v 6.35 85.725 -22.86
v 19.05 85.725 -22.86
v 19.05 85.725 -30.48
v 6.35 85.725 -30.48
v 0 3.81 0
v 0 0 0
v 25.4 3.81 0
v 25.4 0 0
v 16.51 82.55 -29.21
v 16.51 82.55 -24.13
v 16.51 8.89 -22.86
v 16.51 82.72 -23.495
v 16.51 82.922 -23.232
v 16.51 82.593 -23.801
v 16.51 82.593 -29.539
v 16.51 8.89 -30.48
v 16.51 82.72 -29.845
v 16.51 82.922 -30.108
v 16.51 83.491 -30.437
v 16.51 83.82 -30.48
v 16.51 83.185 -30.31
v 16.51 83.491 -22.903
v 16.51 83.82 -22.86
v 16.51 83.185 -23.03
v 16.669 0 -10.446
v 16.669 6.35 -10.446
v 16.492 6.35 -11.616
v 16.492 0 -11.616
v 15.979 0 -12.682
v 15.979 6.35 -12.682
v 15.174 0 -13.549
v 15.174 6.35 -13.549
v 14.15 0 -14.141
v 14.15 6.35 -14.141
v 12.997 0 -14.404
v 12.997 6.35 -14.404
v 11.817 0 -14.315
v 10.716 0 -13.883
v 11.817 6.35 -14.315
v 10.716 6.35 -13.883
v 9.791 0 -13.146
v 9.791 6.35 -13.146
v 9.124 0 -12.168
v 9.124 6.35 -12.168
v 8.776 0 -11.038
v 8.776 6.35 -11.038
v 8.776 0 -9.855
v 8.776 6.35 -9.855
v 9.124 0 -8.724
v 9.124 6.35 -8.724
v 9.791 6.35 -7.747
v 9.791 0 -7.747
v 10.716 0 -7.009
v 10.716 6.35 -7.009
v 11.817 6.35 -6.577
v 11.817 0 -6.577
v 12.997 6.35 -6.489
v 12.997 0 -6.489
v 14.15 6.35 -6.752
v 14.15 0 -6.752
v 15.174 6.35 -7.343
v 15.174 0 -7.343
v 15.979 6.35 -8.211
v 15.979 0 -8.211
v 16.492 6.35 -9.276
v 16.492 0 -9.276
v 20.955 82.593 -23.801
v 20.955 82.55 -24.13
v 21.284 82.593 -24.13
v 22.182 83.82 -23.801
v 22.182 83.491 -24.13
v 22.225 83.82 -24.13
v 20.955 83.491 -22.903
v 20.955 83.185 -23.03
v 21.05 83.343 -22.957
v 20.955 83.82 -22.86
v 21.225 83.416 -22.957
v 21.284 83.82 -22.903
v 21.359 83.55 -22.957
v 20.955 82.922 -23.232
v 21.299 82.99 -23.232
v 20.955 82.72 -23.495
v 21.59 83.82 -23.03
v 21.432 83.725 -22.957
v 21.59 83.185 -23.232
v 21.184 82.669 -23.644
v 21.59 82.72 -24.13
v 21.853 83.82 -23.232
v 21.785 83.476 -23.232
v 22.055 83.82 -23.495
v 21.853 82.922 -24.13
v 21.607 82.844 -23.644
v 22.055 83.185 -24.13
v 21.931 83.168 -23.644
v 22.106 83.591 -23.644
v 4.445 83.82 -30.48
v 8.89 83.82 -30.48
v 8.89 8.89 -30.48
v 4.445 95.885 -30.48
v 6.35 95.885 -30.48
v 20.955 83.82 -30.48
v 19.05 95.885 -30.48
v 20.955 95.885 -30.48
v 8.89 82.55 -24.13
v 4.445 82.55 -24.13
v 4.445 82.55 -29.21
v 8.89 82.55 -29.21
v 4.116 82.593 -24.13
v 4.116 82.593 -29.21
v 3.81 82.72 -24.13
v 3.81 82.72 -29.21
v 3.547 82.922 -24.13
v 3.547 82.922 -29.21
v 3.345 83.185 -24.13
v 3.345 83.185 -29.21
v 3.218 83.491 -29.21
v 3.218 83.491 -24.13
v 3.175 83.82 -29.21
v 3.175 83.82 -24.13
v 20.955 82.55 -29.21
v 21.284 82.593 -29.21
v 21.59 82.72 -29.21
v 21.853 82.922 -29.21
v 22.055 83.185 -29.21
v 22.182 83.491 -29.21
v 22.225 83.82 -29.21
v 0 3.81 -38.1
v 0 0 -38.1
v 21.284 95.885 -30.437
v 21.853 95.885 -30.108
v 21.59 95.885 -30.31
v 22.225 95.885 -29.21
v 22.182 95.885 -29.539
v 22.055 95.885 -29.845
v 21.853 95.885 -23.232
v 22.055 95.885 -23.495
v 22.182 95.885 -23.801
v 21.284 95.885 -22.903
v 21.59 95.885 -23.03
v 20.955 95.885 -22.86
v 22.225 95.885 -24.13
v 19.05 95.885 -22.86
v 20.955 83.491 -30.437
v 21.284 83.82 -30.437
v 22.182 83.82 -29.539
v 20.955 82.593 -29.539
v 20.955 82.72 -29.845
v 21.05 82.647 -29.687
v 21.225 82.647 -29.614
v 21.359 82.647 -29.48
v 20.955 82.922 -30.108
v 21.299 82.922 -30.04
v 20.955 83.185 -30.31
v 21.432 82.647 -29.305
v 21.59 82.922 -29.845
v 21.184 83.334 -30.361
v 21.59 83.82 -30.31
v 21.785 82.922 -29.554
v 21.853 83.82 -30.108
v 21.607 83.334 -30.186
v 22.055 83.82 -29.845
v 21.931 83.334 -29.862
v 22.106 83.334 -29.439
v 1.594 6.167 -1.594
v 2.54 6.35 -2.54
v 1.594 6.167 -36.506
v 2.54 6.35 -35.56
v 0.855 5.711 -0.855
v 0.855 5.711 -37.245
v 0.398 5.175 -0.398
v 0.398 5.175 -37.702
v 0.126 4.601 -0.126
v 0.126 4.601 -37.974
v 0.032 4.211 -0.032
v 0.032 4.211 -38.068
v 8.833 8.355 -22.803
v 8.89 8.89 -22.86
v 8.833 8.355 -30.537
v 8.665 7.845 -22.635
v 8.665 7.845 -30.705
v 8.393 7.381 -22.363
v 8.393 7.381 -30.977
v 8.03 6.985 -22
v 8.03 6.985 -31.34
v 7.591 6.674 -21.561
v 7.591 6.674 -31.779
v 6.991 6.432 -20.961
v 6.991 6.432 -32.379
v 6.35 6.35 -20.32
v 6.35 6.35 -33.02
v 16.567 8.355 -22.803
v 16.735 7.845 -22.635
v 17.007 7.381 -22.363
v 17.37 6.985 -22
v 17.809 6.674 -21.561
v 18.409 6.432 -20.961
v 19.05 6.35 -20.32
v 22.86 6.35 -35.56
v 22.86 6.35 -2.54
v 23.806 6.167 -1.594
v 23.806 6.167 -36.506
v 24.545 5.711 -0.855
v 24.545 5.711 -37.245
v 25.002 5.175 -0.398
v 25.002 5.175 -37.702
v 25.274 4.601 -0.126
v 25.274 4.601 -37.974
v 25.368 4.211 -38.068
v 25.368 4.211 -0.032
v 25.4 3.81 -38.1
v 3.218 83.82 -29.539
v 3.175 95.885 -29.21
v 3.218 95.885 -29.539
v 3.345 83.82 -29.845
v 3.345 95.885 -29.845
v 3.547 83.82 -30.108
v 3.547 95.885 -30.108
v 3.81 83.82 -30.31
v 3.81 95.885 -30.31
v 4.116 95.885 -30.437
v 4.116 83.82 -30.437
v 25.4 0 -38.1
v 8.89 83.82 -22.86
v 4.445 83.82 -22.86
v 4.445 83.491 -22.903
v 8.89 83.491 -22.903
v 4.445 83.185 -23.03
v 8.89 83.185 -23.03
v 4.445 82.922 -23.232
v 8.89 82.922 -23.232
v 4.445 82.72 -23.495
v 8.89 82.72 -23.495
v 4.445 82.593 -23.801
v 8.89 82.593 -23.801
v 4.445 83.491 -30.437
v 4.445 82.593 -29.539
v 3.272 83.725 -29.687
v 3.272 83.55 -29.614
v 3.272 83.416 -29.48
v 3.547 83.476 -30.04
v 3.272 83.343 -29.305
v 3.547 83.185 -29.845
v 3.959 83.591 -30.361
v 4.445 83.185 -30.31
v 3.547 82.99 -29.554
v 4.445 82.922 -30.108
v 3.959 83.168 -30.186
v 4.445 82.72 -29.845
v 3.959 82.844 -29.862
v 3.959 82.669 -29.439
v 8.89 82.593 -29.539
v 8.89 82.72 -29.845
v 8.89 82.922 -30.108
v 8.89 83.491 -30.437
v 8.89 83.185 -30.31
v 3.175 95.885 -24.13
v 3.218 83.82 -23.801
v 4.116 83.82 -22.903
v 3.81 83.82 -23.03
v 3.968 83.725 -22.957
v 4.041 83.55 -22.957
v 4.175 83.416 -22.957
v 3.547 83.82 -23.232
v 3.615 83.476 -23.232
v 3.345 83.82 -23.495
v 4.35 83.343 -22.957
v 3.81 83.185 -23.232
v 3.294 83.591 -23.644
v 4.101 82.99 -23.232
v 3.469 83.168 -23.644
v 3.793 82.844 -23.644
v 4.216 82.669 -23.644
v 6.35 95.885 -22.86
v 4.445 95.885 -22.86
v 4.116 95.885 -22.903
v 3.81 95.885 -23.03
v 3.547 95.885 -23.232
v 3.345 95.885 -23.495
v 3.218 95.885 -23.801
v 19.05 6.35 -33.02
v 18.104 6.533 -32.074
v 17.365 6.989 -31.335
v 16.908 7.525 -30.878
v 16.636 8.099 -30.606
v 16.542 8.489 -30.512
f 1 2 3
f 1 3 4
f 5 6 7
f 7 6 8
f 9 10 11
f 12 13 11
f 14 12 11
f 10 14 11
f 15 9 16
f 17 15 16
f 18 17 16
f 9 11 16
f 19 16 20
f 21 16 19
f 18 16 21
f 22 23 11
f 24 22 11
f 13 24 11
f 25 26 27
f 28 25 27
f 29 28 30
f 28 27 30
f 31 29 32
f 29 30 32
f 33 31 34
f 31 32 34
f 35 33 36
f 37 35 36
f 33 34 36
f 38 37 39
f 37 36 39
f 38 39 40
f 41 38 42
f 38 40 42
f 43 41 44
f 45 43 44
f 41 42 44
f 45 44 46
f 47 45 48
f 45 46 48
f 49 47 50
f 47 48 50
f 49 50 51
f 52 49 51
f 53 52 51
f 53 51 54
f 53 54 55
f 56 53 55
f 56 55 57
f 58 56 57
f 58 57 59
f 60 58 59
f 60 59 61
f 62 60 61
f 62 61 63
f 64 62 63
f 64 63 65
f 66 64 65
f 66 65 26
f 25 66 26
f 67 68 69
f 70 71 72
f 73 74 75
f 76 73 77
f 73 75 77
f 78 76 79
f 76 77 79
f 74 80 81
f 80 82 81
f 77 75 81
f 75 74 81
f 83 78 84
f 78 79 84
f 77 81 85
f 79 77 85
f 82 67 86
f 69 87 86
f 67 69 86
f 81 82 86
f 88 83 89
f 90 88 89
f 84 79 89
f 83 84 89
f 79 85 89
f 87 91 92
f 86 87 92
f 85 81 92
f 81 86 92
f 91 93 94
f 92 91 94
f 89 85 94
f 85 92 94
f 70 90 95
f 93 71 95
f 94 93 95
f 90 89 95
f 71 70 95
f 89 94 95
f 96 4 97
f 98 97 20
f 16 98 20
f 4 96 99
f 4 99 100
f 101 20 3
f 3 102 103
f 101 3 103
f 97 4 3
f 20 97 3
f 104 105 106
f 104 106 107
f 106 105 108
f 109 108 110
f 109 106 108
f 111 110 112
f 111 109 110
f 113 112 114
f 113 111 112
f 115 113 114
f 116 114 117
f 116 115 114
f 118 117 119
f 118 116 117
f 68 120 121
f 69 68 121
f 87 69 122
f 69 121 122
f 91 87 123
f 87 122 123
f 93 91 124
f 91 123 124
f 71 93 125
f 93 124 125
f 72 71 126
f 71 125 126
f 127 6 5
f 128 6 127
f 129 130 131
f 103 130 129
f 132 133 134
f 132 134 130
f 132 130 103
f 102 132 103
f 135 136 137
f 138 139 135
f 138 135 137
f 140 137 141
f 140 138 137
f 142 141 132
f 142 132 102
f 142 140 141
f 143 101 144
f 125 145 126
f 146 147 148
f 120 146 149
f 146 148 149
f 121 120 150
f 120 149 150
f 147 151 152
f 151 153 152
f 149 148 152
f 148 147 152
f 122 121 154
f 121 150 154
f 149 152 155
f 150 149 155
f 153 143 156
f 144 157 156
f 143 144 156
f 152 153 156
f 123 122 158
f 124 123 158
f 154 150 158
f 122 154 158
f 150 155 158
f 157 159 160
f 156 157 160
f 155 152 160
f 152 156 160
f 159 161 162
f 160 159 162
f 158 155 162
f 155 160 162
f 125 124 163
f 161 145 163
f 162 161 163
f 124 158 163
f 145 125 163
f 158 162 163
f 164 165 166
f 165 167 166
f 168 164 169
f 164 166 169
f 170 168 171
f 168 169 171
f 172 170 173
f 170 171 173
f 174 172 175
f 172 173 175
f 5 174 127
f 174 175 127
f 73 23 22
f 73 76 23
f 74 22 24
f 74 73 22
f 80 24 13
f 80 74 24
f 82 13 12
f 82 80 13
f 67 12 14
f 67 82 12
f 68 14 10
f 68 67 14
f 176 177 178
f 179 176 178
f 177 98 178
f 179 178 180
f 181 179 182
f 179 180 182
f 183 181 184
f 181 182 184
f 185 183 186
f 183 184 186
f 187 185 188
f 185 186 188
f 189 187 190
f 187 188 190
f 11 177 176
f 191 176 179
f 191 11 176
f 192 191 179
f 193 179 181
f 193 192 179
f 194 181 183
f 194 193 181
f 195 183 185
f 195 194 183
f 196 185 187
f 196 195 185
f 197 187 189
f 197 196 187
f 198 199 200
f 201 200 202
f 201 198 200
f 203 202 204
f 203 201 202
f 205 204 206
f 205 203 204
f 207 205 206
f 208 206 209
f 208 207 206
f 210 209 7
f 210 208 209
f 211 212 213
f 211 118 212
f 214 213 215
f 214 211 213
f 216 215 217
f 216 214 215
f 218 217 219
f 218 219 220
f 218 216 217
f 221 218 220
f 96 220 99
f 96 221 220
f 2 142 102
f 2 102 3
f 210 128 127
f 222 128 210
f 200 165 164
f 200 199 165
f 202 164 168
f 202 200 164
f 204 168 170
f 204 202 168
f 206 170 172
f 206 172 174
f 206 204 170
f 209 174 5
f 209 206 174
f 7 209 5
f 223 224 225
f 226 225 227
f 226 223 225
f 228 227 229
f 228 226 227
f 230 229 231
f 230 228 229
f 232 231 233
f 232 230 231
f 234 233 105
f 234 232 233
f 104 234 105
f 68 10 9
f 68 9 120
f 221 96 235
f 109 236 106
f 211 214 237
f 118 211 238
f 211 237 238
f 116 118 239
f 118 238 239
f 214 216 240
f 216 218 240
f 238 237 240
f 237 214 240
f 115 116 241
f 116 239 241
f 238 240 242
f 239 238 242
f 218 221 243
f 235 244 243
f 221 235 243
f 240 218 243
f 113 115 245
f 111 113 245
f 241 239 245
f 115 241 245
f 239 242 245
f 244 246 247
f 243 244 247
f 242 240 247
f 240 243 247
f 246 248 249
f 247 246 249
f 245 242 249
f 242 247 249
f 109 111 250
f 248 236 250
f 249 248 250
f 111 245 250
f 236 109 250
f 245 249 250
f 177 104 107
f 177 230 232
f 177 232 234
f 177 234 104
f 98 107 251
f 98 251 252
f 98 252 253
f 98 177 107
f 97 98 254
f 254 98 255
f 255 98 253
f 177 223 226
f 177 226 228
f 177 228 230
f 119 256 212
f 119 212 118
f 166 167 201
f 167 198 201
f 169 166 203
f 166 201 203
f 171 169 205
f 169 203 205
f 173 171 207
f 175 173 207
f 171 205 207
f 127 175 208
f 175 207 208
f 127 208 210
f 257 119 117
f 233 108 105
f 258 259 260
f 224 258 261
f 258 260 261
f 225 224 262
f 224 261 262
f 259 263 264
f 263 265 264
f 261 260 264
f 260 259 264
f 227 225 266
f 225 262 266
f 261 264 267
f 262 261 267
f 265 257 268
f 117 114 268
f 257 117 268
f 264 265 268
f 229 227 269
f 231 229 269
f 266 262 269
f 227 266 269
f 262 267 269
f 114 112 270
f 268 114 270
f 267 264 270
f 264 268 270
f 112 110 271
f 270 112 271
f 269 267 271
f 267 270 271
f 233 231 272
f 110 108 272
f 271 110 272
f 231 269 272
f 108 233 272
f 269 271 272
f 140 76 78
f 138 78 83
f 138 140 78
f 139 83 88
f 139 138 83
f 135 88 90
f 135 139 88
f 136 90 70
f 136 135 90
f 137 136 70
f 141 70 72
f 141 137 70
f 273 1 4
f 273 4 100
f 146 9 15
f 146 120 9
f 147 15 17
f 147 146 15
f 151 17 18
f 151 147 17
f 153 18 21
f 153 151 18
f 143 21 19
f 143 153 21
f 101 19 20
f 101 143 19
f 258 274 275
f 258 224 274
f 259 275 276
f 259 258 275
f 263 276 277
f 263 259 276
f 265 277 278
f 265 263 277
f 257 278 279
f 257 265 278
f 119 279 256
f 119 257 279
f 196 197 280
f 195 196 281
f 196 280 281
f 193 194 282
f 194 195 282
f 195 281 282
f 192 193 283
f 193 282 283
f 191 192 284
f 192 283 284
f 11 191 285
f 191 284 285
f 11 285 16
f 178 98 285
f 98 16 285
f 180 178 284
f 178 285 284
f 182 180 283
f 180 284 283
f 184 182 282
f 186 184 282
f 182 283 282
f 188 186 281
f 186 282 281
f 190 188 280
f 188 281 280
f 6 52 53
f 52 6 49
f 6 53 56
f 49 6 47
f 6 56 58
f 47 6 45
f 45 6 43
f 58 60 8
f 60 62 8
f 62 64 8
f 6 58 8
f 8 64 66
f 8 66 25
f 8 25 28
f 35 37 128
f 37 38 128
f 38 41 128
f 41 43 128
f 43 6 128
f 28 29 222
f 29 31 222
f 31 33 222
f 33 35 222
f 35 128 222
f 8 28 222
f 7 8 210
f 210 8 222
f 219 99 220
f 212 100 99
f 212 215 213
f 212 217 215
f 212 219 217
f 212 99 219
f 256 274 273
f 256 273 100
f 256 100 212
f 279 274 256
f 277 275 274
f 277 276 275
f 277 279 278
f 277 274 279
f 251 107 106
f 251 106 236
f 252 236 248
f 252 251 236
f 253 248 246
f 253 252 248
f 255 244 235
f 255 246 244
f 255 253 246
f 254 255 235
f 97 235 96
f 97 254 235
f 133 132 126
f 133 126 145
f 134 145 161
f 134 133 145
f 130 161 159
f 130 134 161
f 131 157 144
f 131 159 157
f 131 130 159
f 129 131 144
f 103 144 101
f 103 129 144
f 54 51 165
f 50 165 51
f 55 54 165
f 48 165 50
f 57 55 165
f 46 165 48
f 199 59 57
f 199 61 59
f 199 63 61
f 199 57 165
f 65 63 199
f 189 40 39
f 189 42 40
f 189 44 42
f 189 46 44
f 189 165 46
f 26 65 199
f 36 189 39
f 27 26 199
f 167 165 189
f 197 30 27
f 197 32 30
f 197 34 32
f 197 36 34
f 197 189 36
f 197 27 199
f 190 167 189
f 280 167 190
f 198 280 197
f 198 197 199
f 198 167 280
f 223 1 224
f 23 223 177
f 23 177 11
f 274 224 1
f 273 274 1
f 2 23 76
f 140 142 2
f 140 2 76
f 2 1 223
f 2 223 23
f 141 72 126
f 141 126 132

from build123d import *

# Parameters (mm, degrees)
SKETCH2_W           = 25.4
SKETCH2_H           = 38.1
BOSS_EXTRUDE1_DEPTH = 6.35
SKETCH3_W           = 7.62
SKETCH3_H           = 7.62
BOSS_EXTRUDE2_DEPTH = 76.2
BOSS_EXTRUDE3_DEPTH = 7.62
FILLET1_R           = 2.54
SKETCH6_R           = 3.96875
CUT_EXTRUDE1_DEPTH  = 12.7
FILLET2_R           = 1.27


with BuildPart() as part:
    # Sketch2 → Boss-Extrude1 (new body)
    with BuildSketch(Plane(origin=(0, 0, 0), x_dir=(1, 0, 0), z_dir=(0, 1, 0))):
        with Locations((12.7, 19.05)):
            Rectangle(SKETCH2_W, SKETCH2_H)
    extrude(amount=BOSS_EXTRUDE1_DEPTH)

    # Sketch3 → Boss-Extrude2 (add)
    with BuildSketch(Plane(origin=(0, 6.35, 0), x_dir=(1, 0, 0), z_dir=(0, 1, 0))):
        with Locations((12.7, 26.67)):
            Rectangle(SKETCH3_W, SKETCH3_H)
    extrude(amount=BOSS_EXTRUDE2_DEPTH)

    # Sketch5 → Boss-Extrude3 (add)
    with BuildSketch(Plane.XY.offset(-22.86)):
        Polygon((3.175, 82.55), (22.225, 82.55), (22.225, 95.885), (19.05, 95.885), (19.05, 85.725), (6.35, 85.725), (6.35, 95.885), (3.175, 95.885), align=None)
    extrude(amount=-BOSS_EXTRUDE3_DEPTH)

    # Fillet1
    fillet1_edges = [part.edges().sort_by_distance(p)[0] for p in [
        (25.4, 6.35, -19.05),
        (8.89, 6.35, -26.67),
        (12.7, 6.35, -22.86),
        (12.7, 6.35, -38.1),
        (16.51, 6.35, -26.67),
        (12.7, 6.35, -30.48),
        (0, 6.35, -19.05),
        (12.7, 6.35, 0),
    ]]
    fillet(fillet1_edges, radius=FILLET1_R)

    # Sketch6 → Cut-Extrude1 (cut)
    with BuildSketch(Plane(origin=(0, 6.35, 0), x_dir=(1, 0, 0), z_dir=(0, 1, 0))):
        with Locations((12.7, 10.446236213)):
            Circle(SKETCH6_R)
    extrude(amount=-CUT_EXTRUDE1_DEPTH, mode=Mode.SUBTRACT)

    # Fillet2
    fillet2_edges = [part.edges().sort_by_distance(p)[0] for p in [
        (6.0325, 82.55, -30.48),
        (3.175, 89.2175, -30.48),
        (3.175, 82.55, -26.67),
        (22.225, 89.2175, -30.48),
        (19.3675, 82.55, -30.48),
        (22.225, 82.55, -26.67),
        (3.175, 89.2175, -22.86),
        (6.0325, 82.55, -22.86),
        (19.3675, 82.55, -22.86),
        (22.225, 89.2175, -22.86),
    ]]
    fillet(fillet2_edges, radius=FILLET2_R)


solid = part.part
